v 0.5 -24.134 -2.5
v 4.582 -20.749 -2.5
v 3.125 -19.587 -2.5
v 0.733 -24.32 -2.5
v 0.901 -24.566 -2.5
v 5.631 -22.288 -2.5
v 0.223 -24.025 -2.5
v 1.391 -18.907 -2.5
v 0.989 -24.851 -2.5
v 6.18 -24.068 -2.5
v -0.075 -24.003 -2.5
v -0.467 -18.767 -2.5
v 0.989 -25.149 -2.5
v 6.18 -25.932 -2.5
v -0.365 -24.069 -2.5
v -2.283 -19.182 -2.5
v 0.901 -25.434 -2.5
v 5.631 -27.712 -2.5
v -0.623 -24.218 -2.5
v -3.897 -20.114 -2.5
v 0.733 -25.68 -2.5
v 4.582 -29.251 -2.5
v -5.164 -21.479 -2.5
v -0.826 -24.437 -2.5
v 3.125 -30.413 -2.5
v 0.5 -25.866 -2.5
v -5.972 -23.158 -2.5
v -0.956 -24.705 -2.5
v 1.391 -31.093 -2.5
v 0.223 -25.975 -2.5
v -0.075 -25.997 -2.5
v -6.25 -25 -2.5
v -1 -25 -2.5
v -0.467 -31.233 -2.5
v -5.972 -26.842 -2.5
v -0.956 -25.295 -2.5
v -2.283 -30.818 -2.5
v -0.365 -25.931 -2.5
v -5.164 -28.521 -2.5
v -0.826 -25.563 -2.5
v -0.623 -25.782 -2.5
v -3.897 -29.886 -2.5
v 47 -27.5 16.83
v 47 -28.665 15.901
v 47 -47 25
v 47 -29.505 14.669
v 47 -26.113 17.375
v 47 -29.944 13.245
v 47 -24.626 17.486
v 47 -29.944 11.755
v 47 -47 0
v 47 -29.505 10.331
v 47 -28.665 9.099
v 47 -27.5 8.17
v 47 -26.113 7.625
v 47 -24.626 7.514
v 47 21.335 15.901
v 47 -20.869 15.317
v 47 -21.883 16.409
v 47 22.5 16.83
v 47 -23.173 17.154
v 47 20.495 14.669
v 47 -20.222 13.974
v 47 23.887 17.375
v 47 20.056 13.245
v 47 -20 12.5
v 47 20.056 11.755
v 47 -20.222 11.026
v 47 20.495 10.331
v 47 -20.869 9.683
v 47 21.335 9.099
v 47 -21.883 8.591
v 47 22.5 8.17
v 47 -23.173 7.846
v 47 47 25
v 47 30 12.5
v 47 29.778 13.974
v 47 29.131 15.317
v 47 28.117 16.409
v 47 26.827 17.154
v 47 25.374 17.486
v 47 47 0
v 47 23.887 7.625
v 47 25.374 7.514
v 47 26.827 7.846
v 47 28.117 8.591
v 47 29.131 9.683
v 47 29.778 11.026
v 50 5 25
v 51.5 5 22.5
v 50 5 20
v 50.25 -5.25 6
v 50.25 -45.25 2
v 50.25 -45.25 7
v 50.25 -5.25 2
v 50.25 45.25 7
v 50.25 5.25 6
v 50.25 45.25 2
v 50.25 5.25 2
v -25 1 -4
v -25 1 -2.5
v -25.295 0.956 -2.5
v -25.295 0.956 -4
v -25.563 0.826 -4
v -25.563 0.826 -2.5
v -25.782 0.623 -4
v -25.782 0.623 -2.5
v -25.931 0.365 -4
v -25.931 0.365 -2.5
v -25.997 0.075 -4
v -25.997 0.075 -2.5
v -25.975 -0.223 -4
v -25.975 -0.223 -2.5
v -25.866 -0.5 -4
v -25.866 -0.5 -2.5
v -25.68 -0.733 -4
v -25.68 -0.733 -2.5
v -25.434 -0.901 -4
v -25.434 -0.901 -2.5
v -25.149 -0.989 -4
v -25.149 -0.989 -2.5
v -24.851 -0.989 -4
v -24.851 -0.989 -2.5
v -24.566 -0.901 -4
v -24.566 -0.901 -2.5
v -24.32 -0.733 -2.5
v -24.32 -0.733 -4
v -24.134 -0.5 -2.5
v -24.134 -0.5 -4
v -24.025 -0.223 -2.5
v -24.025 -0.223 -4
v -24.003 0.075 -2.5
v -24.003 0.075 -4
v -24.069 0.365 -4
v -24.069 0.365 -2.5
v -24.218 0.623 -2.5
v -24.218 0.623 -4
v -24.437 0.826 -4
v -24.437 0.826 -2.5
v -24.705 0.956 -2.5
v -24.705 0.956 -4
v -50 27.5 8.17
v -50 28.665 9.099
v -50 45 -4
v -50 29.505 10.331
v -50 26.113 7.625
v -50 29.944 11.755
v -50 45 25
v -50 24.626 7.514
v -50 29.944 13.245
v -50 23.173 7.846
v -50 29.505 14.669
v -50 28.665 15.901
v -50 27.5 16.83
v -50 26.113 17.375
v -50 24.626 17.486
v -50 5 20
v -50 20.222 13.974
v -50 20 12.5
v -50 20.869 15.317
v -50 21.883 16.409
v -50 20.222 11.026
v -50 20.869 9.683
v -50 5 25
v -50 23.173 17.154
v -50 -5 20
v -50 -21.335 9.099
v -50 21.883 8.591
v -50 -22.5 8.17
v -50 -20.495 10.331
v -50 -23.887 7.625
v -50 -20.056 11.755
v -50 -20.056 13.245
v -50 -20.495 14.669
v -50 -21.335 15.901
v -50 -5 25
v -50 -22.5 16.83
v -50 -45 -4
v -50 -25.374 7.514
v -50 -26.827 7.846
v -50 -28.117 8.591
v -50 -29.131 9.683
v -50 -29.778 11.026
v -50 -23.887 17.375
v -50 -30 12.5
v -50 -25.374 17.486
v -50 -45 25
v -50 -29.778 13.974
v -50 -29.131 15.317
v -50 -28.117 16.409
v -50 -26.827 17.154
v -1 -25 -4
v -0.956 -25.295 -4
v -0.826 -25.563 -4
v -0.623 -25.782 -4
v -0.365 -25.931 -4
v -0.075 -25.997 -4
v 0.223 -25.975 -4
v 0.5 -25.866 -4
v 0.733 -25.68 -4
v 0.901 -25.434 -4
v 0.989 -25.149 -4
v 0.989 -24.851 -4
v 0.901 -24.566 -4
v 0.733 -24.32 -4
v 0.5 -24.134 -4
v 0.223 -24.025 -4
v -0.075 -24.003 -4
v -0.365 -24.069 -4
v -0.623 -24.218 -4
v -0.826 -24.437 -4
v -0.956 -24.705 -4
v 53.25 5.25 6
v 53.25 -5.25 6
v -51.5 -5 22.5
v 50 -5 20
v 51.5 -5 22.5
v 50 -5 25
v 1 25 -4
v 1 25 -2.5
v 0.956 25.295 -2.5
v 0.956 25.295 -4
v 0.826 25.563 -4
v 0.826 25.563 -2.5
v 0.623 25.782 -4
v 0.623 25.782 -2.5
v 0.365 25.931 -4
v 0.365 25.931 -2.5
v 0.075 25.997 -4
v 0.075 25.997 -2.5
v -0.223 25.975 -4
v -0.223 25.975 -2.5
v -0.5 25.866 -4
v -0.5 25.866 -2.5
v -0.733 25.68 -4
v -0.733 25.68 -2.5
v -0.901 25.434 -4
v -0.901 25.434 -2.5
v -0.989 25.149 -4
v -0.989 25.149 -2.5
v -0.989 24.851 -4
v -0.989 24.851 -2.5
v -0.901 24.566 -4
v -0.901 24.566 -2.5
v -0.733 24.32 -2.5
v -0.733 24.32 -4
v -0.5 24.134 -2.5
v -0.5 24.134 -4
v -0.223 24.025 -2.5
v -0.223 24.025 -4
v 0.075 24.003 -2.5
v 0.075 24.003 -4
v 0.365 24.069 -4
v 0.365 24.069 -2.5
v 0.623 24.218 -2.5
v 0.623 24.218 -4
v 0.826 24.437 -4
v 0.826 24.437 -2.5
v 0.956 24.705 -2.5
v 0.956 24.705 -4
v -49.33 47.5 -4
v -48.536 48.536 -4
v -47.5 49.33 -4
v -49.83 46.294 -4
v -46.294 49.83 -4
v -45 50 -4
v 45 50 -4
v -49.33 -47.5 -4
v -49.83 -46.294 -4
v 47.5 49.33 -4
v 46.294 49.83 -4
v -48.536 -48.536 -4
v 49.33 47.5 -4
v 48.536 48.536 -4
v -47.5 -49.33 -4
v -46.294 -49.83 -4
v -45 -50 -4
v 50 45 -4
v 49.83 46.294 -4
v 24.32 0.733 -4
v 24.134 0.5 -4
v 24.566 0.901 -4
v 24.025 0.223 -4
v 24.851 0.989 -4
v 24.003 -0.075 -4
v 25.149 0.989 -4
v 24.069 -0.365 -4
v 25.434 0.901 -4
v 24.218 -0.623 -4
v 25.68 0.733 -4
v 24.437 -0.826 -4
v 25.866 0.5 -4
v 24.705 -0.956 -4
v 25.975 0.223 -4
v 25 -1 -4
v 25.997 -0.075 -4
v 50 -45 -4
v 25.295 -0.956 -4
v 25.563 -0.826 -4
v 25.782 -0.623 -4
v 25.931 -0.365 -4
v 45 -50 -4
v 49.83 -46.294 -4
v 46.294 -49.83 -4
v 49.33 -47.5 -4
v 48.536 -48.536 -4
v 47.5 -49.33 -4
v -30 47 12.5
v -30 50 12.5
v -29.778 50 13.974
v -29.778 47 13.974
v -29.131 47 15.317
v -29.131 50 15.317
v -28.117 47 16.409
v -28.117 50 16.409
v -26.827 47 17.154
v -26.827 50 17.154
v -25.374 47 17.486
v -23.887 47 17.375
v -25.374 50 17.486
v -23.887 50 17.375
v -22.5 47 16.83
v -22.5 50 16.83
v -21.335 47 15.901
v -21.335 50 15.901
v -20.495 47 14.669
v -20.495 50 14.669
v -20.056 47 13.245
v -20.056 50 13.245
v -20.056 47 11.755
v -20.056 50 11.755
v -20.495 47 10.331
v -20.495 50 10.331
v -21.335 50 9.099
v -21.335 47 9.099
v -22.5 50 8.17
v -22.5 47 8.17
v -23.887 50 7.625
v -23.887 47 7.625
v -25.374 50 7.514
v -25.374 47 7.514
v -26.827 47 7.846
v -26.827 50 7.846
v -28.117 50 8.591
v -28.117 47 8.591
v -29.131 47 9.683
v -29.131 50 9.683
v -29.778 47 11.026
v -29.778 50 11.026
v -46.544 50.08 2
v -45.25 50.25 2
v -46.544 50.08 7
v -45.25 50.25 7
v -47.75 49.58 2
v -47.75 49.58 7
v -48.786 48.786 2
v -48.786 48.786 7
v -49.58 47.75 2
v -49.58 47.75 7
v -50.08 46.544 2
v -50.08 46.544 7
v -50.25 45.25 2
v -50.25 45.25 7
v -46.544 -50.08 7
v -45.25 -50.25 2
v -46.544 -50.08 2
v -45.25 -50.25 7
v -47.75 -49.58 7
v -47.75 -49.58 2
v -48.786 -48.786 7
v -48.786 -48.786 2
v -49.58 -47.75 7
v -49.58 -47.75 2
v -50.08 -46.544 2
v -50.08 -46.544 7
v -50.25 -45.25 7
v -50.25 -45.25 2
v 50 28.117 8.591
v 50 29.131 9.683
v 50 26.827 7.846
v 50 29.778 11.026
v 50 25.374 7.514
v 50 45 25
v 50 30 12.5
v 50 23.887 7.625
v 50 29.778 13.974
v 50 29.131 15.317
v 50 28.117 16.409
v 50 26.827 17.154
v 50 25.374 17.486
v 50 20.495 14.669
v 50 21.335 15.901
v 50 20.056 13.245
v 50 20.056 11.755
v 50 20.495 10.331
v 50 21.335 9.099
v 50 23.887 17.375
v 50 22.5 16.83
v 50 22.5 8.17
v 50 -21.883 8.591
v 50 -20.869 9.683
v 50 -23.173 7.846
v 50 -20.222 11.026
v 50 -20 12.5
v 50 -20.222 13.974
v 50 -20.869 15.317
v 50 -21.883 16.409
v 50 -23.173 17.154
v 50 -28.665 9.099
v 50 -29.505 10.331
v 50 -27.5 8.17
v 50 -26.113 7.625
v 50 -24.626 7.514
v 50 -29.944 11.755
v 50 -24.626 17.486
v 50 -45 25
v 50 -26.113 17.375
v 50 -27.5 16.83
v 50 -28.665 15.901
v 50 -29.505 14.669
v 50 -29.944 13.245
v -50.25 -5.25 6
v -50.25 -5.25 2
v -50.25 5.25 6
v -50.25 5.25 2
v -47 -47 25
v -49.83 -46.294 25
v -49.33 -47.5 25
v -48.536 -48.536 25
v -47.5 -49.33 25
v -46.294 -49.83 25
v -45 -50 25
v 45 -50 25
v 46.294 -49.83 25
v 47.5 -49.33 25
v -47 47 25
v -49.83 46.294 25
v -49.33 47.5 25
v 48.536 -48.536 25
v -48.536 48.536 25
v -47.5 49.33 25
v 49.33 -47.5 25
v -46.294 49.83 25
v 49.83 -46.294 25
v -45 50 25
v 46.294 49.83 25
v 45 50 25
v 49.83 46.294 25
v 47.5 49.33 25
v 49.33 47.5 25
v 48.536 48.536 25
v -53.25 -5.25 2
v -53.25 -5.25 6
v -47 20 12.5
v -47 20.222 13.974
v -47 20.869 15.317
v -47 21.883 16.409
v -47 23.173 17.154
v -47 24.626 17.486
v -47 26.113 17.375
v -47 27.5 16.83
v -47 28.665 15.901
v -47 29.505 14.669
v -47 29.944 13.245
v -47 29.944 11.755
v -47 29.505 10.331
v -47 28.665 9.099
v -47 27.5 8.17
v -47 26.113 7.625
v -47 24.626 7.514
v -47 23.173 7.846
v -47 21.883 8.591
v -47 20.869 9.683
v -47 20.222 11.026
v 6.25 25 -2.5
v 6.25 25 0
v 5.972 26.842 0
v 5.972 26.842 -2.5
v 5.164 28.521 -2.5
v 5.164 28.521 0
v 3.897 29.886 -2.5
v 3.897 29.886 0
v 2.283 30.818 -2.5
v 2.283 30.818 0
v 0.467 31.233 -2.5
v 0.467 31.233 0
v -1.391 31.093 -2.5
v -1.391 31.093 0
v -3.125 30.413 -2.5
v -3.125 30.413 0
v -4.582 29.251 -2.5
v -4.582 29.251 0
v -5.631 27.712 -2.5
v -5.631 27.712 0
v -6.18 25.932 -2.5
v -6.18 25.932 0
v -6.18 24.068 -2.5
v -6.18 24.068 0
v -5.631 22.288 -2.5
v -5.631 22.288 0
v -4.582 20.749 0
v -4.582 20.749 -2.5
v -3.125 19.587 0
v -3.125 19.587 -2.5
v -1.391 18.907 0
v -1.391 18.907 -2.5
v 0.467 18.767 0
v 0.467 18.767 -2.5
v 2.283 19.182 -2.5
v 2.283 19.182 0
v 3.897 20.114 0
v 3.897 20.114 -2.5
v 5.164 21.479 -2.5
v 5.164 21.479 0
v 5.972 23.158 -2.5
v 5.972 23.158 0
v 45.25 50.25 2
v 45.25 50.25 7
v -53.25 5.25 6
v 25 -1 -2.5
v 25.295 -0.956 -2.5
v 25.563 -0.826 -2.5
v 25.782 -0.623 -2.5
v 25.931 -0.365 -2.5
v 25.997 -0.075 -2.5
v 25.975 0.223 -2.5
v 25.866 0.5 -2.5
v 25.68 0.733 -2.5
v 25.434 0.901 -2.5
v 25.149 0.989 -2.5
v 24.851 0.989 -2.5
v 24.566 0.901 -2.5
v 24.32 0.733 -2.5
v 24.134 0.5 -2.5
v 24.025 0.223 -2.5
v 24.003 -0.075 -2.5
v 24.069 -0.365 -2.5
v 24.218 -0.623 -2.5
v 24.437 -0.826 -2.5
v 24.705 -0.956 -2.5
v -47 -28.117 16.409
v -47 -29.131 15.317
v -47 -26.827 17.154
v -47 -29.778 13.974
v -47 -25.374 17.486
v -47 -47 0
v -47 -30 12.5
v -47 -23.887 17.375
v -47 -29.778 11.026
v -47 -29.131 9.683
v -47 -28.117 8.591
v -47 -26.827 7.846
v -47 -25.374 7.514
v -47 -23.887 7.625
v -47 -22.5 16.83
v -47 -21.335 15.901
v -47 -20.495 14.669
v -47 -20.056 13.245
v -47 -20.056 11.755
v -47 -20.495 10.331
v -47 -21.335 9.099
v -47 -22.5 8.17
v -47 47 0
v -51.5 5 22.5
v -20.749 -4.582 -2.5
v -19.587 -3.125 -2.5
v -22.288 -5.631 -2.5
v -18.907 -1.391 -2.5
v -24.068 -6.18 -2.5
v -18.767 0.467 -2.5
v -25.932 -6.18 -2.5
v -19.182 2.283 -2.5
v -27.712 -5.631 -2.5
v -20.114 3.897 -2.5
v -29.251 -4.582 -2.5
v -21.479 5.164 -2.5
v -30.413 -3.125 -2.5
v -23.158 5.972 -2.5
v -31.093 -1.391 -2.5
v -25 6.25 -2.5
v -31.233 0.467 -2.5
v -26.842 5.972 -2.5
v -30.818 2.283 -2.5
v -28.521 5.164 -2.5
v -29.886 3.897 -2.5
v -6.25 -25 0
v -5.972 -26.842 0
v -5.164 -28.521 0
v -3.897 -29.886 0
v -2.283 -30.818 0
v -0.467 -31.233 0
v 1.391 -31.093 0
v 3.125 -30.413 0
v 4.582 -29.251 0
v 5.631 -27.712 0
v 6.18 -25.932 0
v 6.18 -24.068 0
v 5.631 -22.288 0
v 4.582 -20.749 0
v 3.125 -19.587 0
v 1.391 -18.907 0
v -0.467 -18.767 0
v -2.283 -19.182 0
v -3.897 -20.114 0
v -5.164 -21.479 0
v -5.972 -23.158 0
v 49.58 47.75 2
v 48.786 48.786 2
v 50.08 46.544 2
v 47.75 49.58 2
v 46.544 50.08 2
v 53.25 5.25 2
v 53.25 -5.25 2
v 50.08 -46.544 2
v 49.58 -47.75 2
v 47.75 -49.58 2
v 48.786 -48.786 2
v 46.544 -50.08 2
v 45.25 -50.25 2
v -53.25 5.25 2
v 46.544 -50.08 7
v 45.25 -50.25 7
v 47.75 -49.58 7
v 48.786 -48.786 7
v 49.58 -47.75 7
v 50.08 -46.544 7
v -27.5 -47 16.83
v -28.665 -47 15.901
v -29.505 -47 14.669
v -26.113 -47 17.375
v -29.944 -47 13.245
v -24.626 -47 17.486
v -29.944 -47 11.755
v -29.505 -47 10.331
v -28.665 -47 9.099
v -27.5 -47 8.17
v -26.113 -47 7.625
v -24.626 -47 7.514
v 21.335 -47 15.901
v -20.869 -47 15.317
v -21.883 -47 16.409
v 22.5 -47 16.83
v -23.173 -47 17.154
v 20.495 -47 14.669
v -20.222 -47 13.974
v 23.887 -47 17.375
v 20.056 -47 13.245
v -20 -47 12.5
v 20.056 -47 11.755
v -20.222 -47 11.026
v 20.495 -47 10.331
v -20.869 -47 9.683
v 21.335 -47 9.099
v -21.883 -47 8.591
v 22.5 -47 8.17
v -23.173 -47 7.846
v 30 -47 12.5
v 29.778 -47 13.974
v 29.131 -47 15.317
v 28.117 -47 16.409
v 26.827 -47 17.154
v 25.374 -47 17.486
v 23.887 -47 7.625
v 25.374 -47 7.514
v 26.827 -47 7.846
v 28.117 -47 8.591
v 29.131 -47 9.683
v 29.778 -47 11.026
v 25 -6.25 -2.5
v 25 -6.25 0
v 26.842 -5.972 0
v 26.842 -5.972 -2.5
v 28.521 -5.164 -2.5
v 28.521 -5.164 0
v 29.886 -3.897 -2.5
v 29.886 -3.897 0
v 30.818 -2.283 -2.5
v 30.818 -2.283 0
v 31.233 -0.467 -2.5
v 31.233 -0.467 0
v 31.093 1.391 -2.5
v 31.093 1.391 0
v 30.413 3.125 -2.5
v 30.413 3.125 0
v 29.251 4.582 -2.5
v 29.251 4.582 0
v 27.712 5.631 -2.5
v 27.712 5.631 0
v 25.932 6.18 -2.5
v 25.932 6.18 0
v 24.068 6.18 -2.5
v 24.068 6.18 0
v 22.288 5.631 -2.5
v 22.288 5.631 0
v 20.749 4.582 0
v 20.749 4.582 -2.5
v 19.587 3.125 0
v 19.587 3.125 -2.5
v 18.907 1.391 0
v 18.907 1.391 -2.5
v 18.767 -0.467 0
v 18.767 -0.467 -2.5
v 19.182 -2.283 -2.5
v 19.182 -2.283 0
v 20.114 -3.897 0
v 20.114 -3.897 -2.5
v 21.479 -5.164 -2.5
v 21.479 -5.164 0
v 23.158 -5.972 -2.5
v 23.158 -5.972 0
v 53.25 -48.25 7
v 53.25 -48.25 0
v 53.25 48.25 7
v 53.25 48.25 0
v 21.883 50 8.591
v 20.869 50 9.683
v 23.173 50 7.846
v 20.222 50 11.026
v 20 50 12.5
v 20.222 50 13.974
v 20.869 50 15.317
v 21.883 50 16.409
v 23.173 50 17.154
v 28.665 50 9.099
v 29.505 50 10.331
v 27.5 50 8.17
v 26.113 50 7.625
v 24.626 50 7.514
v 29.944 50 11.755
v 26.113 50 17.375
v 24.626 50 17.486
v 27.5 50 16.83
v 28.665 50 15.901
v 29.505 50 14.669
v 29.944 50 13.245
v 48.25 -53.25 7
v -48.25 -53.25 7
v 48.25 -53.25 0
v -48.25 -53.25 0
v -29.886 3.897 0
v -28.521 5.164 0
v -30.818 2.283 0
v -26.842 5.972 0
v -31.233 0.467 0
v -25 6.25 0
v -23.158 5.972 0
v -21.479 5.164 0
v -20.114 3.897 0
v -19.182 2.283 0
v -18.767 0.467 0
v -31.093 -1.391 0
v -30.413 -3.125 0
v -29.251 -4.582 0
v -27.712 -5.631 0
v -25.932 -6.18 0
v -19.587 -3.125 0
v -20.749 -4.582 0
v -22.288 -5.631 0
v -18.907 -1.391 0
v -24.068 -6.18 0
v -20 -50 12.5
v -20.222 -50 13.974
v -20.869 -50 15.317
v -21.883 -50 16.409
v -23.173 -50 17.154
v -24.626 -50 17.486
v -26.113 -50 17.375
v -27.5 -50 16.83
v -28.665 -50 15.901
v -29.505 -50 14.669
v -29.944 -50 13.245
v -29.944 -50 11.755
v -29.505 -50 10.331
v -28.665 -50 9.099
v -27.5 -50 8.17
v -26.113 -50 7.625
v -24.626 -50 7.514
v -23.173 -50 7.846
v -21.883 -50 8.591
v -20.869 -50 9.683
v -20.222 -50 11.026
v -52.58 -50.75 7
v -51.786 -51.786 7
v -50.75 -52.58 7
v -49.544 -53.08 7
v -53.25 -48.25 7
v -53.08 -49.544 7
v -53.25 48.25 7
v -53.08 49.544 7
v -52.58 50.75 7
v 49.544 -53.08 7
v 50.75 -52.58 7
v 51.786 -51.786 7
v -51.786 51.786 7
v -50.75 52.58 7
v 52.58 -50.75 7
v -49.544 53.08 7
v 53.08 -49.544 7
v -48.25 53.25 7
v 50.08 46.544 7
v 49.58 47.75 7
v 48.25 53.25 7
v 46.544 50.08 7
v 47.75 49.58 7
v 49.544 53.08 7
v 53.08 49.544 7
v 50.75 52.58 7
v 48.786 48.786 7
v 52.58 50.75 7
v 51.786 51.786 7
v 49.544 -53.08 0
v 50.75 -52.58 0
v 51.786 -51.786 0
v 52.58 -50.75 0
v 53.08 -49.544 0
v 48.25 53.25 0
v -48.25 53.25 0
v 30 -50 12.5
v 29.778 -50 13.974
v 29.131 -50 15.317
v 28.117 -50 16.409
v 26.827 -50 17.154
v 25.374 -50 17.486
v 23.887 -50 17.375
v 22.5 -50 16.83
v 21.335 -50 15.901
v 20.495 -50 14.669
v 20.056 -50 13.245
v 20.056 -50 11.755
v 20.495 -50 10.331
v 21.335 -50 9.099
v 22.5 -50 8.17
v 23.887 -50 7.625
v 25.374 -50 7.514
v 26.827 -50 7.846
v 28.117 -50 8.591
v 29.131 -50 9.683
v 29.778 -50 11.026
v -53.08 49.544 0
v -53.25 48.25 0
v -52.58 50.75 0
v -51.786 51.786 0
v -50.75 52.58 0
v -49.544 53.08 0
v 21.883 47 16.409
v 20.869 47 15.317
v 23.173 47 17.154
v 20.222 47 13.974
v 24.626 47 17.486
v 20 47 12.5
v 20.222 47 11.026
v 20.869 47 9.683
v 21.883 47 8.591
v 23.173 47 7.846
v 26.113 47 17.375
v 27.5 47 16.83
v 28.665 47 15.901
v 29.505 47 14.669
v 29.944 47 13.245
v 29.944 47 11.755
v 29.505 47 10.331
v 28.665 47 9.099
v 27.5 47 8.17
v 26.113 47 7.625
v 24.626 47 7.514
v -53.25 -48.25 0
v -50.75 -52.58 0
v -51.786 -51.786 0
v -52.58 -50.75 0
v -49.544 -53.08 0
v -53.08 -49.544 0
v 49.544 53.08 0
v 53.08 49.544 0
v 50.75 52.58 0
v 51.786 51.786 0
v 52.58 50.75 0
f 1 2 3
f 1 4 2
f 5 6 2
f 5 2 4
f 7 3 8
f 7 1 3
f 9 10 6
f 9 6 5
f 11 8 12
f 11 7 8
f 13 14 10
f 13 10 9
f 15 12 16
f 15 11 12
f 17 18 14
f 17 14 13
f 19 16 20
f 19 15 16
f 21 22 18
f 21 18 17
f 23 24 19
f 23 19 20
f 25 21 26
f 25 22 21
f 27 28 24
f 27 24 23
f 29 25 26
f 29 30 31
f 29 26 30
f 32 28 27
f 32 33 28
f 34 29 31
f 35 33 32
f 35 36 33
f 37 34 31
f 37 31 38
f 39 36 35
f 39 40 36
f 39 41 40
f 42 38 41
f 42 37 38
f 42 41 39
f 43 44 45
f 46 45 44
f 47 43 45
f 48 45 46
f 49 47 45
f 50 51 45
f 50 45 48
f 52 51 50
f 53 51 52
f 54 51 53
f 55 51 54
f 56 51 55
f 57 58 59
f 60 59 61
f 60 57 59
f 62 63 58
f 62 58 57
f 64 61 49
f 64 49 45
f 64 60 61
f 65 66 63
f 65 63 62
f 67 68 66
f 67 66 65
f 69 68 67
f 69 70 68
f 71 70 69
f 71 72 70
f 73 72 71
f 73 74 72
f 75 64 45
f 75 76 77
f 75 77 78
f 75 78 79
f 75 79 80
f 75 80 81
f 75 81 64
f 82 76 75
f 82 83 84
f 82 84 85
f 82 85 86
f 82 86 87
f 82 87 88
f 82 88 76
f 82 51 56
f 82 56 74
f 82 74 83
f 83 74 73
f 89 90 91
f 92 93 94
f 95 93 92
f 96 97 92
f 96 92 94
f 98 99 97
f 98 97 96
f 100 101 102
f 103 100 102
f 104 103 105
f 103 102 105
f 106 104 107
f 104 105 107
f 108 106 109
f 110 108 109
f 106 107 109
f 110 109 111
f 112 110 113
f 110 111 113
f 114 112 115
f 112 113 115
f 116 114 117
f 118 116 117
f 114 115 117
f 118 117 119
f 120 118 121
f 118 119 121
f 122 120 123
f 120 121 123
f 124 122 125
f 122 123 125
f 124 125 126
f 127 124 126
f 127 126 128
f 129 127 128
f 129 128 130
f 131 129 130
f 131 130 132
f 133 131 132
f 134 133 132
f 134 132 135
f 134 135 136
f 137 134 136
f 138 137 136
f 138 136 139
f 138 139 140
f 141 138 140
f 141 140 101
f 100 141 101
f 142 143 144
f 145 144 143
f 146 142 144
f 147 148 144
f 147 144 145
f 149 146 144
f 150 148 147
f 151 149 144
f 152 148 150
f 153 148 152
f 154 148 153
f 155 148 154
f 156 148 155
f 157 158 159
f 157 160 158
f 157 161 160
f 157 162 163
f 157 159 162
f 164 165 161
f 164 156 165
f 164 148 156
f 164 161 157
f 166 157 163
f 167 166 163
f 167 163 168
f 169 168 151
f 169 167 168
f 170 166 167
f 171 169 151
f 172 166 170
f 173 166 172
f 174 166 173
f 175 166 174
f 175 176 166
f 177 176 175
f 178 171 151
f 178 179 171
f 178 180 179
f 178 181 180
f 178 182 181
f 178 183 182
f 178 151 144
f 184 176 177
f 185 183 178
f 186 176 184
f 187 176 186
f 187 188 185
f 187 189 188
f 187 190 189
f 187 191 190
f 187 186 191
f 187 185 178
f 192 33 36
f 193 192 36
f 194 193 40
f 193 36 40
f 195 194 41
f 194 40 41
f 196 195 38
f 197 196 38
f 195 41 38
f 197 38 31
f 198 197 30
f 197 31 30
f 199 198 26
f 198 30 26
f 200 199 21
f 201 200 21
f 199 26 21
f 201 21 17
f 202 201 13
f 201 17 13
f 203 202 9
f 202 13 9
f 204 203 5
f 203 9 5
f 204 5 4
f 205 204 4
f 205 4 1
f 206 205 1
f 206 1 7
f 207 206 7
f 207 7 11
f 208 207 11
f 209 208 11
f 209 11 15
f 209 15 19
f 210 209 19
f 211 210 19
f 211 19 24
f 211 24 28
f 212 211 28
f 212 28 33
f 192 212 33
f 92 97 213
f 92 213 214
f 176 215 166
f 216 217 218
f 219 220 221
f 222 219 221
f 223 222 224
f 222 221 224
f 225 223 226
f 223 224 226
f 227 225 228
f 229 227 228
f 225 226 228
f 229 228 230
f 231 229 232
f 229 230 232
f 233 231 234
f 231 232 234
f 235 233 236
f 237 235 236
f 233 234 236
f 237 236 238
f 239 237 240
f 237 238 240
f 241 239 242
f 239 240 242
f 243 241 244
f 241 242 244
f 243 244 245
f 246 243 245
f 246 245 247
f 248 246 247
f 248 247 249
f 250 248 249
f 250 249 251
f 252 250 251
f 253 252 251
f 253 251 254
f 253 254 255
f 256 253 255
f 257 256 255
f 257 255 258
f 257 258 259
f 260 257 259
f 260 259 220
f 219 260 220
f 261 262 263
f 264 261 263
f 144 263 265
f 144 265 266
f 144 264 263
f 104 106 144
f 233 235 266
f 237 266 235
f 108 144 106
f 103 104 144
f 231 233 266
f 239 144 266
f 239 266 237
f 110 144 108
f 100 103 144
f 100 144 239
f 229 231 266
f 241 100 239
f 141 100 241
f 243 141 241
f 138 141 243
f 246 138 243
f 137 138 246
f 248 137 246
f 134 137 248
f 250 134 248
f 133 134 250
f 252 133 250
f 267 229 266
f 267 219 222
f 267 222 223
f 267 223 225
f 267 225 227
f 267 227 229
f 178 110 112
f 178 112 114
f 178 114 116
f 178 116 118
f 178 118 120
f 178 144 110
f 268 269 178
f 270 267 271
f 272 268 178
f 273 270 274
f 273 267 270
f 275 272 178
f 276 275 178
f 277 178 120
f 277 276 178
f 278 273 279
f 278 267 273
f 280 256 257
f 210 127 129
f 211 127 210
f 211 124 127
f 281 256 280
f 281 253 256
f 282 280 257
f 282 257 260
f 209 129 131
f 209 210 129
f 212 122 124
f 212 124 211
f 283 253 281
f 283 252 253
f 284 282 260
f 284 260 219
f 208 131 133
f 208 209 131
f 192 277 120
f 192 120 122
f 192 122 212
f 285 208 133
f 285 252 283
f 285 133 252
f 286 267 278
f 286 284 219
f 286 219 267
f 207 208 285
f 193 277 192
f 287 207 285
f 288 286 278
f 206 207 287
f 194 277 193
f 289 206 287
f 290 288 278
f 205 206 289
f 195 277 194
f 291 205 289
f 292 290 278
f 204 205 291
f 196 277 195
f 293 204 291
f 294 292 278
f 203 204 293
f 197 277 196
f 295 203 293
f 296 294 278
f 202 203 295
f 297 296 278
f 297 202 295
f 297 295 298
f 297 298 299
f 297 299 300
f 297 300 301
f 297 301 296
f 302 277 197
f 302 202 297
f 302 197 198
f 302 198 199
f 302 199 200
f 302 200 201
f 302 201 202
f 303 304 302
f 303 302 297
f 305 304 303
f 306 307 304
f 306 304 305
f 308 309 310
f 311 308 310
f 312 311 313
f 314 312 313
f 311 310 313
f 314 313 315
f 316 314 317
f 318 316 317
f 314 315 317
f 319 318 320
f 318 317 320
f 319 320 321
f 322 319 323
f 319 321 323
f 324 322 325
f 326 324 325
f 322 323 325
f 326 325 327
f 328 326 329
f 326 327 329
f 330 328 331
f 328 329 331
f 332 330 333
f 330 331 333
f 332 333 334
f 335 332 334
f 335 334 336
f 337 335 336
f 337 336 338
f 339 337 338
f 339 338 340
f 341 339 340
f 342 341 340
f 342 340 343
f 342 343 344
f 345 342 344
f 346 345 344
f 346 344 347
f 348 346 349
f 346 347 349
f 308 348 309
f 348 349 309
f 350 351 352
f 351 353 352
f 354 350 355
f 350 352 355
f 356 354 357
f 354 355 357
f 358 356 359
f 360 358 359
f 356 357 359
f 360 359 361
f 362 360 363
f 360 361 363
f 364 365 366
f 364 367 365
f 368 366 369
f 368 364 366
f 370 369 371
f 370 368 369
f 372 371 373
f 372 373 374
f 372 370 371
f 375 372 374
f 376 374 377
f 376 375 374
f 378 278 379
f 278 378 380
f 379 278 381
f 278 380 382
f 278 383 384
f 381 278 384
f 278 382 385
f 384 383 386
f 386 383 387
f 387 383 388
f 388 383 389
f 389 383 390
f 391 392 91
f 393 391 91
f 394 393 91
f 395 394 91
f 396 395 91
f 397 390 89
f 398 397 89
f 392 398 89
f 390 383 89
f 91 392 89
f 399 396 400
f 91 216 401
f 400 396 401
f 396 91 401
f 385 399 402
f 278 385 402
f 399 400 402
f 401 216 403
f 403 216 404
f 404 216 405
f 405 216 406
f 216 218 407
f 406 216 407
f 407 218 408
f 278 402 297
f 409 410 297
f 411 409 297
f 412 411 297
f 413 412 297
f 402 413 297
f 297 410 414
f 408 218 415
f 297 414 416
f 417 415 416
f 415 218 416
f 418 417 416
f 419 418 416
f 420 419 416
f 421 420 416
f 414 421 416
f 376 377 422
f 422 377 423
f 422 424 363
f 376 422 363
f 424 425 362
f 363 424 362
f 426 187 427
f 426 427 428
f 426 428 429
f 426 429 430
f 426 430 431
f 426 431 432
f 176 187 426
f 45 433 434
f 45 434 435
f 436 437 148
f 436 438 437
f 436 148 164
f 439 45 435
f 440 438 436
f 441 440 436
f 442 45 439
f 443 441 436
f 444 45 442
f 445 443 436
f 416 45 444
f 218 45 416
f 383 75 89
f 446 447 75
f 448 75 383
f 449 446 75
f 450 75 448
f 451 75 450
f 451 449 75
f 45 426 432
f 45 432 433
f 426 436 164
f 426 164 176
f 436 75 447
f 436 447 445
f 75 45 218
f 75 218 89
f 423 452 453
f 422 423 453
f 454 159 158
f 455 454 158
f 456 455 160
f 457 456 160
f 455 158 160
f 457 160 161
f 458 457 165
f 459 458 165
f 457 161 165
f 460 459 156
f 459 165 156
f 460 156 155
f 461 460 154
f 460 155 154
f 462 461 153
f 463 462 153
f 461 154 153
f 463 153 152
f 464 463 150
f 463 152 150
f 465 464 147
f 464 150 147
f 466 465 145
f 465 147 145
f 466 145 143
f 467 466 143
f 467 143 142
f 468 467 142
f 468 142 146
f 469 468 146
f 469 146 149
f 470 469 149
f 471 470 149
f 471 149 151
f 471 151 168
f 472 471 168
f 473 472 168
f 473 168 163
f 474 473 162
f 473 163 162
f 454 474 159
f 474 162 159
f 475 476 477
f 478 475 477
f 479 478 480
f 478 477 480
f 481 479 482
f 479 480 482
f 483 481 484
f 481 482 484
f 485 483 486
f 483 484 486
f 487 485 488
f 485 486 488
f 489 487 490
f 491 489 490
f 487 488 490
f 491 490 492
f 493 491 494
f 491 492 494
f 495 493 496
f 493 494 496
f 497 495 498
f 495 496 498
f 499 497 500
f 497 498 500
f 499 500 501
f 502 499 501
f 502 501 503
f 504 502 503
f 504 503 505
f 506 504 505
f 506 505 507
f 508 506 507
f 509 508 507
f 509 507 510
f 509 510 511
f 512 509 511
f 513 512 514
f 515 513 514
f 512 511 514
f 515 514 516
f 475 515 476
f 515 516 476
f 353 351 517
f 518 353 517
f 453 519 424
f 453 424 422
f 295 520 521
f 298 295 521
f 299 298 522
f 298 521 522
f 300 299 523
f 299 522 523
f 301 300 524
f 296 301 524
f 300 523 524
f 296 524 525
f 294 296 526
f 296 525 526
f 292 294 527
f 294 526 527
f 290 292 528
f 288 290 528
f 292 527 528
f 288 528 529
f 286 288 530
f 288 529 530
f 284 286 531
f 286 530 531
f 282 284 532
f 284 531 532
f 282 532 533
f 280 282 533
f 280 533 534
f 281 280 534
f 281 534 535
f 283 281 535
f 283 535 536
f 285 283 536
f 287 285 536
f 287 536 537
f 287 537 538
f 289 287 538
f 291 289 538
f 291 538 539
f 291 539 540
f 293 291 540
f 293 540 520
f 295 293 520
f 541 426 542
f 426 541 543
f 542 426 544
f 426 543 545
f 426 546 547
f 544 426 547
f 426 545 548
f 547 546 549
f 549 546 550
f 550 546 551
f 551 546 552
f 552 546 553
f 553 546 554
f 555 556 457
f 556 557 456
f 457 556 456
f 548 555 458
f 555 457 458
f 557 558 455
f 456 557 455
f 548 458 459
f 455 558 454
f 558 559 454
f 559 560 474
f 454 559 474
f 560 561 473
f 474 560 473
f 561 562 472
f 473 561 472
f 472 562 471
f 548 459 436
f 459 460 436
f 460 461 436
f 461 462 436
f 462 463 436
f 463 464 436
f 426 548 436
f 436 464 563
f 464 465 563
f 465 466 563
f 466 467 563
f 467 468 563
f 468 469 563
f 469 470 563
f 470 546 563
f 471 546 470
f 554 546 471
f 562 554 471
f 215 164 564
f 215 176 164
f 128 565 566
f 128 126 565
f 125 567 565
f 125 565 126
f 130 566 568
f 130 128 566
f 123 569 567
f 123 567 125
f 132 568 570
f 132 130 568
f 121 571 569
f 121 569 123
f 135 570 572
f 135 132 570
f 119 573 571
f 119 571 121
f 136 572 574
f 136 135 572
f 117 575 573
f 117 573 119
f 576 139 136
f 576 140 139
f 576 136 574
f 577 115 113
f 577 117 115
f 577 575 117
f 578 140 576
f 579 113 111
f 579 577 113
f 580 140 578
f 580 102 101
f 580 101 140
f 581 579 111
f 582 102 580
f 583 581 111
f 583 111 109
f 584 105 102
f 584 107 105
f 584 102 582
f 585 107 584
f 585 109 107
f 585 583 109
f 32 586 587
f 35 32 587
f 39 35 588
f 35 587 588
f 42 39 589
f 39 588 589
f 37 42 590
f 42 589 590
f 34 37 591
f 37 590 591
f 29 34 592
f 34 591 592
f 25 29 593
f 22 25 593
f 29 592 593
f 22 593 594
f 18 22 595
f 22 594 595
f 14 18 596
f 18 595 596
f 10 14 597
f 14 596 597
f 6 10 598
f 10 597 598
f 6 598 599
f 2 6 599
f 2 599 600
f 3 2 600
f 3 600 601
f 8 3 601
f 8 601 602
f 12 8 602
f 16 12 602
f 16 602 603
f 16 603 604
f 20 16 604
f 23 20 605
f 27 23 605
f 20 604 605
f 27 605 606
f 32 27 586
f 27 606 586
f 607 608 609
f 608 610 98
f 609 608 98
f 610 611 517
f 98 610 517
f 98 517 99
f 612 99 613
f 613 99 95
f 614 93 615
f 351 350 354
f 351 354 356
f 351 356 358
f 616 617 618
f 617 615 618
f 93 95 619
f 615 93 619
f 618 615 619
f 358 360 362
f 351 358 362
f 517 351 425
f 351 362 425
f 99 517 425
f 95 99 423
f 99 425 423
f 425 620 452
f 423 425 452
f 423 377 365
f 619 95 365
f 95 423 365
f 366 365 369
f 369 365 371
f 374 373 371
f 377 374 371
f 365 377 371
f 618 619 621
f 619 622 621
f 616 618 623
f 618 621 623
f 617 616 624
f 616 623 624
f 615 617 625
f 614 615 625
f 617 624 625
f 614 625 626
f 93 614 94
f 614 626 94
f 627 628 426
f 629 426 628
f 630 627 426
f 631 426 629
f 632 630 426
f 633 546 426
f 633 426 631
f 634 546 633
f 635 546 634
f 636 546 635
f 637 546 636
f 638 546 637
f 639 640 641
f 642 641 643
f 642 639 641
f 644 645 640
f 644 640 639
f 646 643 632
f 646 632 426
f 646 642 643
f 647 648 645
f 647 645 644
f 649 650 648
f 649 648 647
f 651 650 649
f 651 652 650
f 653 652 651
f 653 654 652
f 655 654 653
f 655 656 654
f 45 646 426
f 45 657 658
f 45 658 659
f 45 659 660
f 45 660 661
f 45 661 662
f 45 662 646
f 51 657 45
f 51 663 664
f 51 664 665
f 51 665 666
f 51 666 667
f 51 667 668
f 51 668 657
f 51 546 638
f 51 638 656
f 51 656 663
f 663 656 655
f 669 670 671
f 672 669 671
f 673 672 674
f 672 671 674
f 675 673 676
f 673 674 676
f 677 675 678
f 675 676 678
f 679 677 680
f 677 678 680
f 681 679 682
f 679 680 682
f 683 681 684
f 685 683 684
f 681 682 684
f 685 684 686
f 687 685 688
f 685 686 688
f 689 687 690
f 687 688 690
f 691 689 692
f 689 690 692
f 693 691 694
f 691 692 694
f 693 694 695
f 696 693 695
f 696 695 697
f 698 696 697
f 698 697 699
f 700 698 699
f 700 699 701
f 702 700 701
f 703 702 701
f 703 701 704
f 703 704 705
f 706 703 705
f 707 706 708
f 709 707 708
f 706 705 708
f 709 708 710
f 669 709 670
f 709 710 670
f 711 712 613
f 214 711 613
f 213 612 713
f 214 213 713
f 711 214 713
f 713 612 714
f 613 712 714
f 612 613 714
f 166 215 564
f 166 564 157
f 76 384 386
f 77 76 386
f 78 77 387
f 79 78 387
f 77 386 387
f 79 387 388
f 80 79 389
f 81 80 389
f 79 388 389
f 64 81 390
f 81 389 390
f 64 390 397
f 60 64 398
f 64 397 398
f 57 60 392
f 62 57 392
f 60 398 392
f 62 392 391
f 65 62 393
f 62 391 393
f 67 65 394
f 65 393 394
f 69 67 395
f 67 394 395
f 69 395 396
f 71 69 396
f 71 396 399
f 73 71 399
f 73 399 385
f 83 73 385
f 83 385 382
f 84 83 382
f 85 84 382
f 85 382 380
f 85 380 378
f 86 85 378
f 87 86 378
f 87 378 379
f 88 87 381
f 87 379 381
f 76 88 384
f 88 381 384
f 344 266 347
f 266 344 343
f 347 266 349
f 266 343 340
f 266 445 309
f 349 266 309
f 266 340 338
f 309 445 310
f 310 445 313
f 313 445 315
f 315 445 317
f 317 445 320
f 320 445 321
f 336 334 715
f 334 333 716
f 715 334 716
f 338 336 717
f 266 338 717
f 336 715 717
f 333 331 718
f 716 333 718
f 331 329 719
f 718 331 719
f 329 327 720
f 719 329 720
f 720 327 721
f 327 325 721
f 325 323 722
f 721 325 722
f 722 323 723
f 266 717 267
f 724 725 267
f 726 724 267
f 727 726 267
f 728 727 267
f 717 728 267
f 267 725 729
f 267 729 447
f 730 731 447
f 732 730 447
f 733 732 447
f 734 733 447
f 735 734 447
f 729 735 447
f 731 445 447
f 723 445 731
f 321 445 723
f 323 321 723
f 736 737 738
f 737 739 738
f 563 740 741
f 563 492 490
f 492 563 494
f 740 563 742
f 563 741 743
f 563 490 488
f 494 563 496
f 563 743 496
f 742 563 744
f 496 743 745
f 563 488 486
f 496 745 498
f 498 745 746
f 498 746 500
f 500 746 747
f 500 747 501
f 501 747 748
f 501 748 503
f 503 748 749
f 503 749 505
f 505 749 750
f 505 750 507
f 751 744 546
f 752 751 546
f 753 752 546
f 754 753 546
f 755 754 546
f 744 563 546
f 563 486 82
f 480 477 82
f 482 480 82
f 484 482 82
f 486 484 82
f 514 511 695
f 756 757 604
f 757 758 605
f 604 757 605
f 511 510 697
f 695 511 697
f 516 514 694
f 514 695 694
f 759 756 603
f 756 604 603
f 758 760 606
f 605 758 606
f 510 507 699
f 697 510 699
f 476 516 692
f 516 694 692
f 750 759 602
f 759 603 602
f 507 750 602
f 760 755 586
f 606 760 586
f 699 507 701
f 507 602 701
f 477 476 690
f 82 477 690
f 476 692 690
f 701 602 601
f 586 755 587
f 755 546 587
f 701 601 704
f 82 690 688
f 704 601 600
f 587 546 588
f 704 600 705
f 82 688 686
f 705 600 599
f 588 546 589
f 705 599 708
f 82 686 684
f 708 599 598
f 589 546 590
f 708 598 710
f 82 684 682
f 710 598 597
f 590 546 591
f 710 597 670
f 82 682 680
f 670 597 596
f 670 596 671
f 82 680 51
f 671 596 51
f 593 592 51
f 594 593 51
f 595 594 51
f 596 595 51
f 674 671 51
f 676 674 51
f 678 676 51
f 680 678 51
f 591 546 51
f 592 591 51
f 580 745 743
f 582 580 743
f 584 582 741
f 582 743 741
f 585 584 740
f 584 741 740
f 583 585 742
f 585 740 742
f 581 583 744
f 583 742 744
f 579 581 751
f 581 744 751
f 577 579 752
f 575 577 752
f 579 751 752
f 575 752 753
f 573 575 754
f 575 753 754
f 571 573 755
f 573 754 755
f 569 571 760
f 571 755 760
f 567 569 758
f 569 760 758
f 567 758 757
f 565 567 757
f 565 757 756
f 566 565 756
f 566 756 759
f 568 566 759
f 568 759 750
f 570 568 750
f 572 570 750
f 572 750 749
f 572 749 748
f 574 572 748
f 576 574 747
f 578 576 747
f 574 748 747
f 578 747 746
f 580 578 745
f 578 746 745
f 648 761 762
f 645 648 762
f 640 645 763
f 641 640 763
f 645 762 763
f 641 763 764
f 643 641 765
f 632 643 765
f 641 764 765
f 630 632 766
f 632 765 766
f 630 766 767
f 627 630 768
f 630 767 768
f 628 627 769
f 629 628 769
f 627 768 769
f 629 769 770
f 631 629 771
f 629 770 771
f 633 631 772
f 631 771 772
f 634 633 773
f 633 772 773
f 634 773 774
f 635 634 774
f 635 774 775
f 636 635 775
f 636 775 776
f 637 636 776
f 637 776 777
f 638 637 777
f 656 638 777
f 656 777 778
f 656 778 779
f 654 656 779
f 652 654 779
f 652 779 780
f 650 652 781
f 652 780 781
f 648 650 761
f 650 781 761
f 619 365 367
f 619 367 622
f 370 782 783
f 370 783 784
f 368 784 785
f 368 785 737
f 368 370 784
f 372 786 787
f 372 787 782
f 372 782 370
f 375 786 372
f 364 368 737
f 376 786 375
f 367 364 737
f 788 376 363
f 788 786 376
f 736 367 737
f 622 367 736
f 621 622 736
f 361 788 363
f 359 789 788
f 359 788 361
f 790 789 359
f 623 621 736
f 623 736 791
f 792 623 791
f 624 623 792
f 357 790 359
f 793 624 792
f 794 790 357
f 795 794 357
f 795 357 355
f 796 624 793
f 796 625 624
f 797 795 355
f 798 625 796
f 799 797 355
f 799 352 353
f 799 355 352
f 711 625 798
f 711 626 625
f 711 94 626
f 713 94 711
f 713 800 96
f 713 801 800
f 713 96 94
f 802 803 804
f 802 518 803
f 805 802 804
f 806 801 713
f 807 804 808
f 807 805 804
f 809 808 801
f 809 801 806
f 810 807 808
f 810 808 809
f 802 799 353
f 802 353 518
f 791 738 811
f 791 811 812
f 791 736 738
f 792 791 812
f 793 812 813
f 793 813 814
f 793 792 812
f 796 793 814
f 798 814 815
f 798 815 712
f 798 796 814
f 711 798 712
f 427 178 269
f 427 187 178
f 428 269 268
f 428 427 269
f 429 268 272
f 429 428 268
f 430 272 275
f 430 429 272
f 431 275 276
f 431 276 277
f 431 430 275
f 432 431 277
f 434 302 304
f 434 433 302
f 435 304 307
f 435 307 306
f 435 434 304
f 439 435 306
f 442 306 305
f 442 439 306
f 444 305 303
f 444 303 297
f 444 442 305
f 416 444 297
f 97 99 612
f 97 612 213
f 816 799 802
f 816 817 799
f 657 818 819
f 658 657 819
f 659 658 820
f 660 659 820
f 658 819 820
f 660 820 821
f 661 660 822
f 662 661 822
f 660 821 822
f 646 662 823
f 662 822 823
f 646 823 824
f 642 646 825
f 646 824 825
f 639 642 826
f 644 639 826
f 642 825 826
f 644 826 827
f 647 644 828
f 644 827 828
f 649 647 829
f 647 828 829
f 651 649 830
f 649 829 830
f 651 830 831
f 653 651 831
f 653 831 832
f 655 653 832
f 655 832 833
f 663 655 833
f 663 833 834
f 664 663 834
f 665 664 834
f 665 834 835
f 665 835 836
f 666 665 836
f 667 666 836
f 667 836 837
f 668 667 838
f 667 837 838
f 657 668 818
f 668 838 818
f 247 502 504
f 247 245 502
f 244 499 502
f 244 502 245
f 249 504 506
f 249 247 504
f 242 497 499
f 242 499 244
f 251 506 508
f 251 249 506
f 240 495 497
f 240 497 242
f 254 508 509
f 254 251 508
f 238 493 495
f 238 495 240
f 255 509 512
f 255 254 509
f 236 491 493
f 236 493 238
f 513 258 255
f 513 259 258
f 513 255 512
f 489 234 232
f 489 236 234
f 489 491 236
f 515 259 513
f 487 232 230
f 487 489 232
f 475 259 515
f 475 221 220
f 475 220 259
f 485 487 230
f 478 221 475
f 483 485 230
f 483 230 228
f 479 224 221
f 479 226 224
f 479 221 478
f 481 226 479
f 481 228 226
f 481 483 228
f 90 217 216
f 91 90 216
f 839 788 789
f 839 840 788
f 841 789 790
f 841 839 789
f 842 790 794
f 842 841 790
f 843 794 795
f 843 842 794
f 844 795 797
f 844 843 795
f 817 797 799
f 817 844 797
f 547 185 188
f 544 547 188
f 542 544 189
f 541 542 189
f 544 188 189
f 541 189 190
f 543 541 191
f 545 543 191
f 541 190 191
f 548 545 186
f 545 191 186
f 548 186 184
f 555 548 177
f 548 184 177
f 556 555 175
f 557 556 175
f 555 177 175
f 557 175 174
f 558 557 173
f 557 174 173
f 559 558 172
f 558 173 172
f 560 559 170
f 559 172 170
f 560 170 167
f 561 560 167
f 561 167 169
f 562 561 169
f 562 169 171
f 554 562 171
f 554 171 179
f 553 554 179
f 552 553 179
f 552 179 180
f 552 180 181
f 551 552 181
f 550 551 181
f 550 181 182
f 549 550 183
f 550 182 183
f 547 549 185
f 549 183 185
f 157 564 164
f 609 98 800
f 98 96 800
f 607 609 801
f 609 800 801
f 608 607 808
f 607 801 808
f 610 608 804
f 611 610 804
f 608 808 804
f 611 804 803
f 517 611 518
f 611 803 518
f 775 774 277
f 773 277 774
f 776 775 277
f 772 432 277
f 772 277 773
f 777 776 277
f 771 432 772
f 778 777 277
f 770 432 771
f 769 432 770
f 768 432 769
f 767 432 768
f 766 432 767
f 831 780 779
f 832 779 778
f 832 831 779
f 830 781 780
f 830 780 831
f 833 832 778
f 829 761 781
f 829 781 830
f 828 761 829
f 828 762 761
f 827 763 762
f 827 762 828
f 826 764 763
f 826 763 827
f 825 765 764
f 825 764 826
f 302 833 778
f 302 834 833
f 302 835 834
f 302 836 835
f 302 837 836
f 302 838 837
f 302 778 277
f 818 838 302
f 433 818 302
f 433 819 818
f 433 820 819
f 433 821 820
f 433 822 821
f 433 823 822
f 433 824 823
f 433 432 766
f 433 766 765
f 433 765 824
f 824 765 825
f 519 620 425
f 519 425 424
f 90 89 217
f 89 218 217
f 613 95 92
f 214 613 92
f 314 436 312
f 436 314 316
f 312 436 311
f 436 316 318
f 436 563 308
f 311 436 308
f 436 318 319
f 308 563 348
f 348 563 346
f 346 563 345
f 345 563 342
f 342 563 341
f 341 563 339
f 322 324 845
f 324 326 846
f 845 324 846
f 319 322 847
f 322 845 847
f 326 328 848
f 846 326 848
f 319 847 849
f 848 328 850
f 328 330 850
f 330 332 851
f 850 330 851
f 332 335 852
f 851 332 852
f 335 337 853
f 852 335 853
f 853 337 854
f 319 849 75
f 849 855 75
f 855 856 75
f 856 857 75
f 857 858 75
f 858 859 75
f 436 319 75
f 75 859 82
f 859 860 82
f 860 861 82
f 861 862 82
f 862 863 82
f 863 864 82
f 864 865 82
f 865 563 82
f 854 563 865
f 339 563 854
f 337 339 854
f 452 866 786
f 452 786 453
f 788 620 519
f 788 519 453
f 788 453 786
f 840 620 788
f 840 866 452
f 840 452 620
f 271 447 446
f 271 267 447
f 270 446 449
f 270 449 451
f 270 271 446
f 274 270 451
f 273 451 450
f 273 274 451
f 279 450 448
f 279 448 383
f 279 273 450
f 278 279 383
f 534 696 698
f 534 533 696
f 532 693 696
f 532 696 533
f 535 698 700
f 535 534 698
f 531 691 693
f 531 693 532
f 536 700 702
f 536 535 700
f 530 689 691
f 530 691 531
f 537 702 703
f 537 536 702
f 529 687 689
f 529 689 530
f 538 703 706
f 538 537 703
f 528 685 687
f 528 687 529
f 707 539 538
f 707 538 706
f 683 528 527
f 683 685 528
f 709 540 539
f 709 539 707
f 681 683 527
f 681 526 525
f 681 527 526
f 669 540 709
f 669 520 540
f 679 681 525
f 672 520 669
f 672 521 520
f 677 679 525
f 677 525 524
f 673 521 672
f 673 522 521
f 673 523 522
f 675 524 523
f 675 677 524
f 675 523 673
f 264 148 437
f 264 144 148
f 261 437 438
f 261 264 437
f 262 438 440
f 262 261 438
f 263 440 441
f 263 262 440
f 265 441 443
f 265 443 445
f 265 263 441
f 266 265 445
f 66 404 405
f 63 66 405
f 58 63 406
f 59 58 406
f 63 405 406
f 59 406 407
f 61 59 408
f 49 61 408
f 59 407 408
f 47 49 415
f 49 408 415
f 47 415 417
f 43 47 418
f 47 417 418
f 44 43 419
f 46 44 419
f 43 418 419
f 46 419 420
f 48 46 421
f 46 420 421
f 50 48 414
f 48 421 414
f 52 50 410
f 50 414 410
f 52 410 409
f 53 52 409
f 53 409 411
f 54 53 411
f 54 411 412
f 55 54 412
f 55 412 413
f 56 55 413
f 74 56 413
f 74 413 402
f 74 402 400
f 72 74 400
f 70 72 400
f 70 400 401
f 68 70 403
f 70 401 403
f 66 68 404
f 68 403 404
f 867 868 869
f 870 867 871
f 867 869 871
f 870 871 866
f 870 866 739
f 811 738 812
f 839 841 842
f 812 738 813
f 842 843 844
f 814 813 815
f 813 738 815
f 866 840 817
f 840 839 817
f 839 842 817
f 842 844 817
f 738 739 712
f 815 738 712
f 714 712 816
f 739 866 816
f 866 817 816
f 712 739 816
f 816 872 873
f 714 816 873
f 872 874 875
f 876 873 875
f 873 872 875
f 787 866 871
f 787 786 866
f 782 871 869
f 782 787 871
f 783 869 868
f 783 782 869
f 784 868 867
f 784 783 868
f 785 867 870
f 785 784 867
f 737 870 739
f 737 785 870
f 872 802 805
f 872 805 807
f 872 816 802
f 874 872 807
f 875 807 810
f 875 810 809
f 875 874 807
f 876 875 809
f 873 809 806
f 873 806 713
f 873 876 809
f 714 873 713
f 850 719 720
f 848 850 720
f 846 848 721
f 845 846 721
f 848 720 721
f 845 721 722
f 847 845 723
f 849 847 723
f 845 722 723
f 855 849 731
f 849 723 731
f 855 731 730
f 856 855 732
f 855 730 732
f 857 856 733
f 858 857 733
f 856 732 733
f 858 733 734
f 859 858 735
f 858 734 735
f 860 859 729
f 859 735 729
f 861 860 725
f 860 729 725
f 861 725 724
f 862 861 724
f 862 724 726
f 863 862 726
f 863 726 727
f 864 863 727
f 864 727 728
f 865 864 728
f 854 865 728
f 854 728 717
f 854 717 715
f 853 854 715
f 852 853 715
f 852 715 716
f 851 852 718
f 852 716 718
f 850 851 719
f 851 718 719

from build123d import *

# Parameters (mm, degrees)
SKETCH_W              = 100
SKETCH_H              = 100
SKETCH_W_2            = 94
SKETCH_H_2            = 94
PAD_DEPTH             = 25
SKETCH001_W           = 100
SKETCH001_H           = 100
PAD001_DEPTH          = 4
SKETCH002_R           = 5
POCKET_DEPTH          = 3
POLARPATTERN_COUNT    = 4
FILLET_R              = 5
SKETCH003_R           = 6.25
POCKET001_DEPTH       = 2.5
POLARPATTERN001_COUNT = 4
SKETCH004_R           = 1
POCKET002_DEPTH       = 290.229246
POLARPATTERN002_COUNT = 4
PAD002_DEPTH          = 5
SKETCH006_W           = 106.5
SKETCH006_H           = 106.5
PAD003_DEPTH          = 2
SKETCH007_W           = 106.5
SKETCH007_H           = 106.5
SKETCH007_W_2         = 100.5
SKETCH007_H_2         = 100.5
PAD004_DEPTH          = 5
SKETCH008_W           = 10.5
SKETCH008_H           = 4
POCKET003_DEPTH       = 106.501
FILLET001_R           = 5
FILLET002_R           = 5


with BuildPart() as body:
    # Sketch → Pad (new body)
    with BuildSketch(Plane.XY):
        Rectangle(SKETCH_W, SKETCH_H)
        Rectangle(SKETCH_W_2, SKETCH_H_2, mode=Mode.SUBTRACT)
    extrude(amount=PAD_DEPTH)

    # Sketch001 (on Face9 of Pad) → Pad001 (join)
    with BuildSketch(Plane(origin=(0, 0, 0), x_dir=(1, 0, 0), z_dir=(0, 0, -1))):
        Rectangle(SKETCH001_W, SKETCH001_H)
    extrude(amount=PAD001_DEPTH)

    # Sketch002 (on Face6 of Pad001) → Pocket (cut)
    with BuildSketch(Plane.XZ.offset(50)):
        with Locations((-25, 12.5)):
            Circle(SKETCH002_R)
        with Locations((25, 12.5)):
            Circle(SKETCH002_R)
    pocket = extrude(amount=-POCKET_DEPTH, mode=Mode.SUBTRACT)

    # PolarPattern: Pocket ×4 about axis
    polarpattern_axis = Axis((0, 0, 0), (0, 0, 1))
    for i in range(1, POLARPATTERN_COUNT):
        add(pocket.rotate(polarpattern_axis, i * 360 / POLARPATTERN_COUNT), mode=Mode.SUBTRACT)

    # Fillet
    fillet_edges = [body.edges().sort_by_distance(p)[0] for p in [
        (-50, -50, 12.5),
        (-50, -50, -2),
        (50, -50, 12.5),
        (50, -50, -2),
        (50, 50, 12.5),
        (50, 50, -2),
        (-50, 50, 12.5),
        (-50, 50, -2),
    ]]
    fillet(fillet_edges, radius=FILLET_R)

    # Sketch003 (on Face31 of Fillet) → Pocket001 (cut)
    with BuildSketch(Plane.XY):
        with Locations((0, 25)):
            Circle(SKETCH003_R)
    pocket001 = extrude(amount=-POCKET001_DEPTH, mode=Mode.SUBTRACT)

    # PolarPattern001: Pocket001 ×4 about axis
    polarpattern001_axis = Axis((0, 0, 0), (0, 0, 1))
    for i in range(1, POLARPATTERN001_COUNT):
        add(pocket001.rotate(polarpattern001_axis, i * 360 / POLARPATTERN001_COUNT), mode=Mode.SUBTRACT)

    # Sketch004 (on Face39 of PolarPattern001) → Pocket002 (cut, through all)
    with BuildSketch(Plane.XY.offset(-2.5)):
        with Locations((0, 25)):
            Circle(SKETCH004_R)
    pocket002 = extrude(amount=-POCKET002_DEPTH, mode=Mode.SUBTRACT)

    # PolarPattern002: Pocket002 ×4 about axis
    polarpattern002_axis = Axis((0, 0, -2.5), (0, 0, 1))
    for i in range(1, POLARPATTERN002_COUNT):
        add(pocket002.rotate(polarpattern002_axis, i * 360 / POLARPATTERN002_COUNT), mode=Mode.SUBTRACT)

    # Sketch005 → Pad002 (join, symmetric)
    with BuildSketch(Plane.XZ):
        Polygon((-50, 25), (-51.5, 22.5), (-50, 20), align=None)
    pad002 = extrude(amount=PAD002_DEPTH, both=True)

    # Mirrored: Pad002 across Sketch005 V_Axis
    add(pad002.mirror(Plane(origin=(0, 0, 0), x_dir=(0, -1, 0), z_dir=(1, 0, 0))))


with BuildPart() as lid:
    # Sketch006 → Pad003 (new body)
    with BuildSketch(Plane.XY):
        Rectangle(SKETCH006_W, SKETCH006_H)
    extrude(amount=PAD003_DEPTH)

    # Sketch007 (on Face6 of Pad003) → Pad004 (join)
    with BuildSketch(Plane.XY.offset(2)):
        Rectangle(SKETCH007_W, SKETCH007_H)
        Rectangle(SKETCH007_W_2, SKETCH007_H_2, mode=Mode.SUBTRACT)
    extrude(amount=PAD004_DEPTH)

    # Sketch008 (on Face8 of Pad004) → Pocket003 (cut, through all)
    with BuildSketch(Plane(origin=(-53.25, 0, 0), x_dir=(0, -1, 0), z_dir=(-1, 0, 0))):
        with Locations((0, 4)):
            Rectangle(SKETCH008_W, SKETCH008_H)
    extrude(amount=-POCKET003_DEPTH, mode=Mode.SUBTRACT)

    # Fillet001
    fillet001_edges = [lid.edges().sort_by_distance(p)[0] for p in [
        (-50.25, -50.25, 4.5),
        (50.25, -50.25, 4.5),
        (50.25, 50.25, 4.5),
        (-50.25, 50.25, 4.5),
    ]]
    fillet(fillet001_edges, radius=FILLET001_R)

    # Fillet002
    fillet002_edges = [lid.edges().sort_by_distance(p)[0] for p in [
        (-53.25, 53.25, 1),
        (53.25, -53.25, 4.5),
        (-53.25, -53.25, 1),
        (53.25, 53.25, 4.5),
        (-53.25, 53.25, 4.5),
        (-53.25, -53.25, 4.5),
        (53.25, -53.25, 1),
        (53.25, 53.25, 1),
    ]]
    fillet(fillet002_edges, radius=FILLET002_R)


solid = Compound([body.part, lid.part])
